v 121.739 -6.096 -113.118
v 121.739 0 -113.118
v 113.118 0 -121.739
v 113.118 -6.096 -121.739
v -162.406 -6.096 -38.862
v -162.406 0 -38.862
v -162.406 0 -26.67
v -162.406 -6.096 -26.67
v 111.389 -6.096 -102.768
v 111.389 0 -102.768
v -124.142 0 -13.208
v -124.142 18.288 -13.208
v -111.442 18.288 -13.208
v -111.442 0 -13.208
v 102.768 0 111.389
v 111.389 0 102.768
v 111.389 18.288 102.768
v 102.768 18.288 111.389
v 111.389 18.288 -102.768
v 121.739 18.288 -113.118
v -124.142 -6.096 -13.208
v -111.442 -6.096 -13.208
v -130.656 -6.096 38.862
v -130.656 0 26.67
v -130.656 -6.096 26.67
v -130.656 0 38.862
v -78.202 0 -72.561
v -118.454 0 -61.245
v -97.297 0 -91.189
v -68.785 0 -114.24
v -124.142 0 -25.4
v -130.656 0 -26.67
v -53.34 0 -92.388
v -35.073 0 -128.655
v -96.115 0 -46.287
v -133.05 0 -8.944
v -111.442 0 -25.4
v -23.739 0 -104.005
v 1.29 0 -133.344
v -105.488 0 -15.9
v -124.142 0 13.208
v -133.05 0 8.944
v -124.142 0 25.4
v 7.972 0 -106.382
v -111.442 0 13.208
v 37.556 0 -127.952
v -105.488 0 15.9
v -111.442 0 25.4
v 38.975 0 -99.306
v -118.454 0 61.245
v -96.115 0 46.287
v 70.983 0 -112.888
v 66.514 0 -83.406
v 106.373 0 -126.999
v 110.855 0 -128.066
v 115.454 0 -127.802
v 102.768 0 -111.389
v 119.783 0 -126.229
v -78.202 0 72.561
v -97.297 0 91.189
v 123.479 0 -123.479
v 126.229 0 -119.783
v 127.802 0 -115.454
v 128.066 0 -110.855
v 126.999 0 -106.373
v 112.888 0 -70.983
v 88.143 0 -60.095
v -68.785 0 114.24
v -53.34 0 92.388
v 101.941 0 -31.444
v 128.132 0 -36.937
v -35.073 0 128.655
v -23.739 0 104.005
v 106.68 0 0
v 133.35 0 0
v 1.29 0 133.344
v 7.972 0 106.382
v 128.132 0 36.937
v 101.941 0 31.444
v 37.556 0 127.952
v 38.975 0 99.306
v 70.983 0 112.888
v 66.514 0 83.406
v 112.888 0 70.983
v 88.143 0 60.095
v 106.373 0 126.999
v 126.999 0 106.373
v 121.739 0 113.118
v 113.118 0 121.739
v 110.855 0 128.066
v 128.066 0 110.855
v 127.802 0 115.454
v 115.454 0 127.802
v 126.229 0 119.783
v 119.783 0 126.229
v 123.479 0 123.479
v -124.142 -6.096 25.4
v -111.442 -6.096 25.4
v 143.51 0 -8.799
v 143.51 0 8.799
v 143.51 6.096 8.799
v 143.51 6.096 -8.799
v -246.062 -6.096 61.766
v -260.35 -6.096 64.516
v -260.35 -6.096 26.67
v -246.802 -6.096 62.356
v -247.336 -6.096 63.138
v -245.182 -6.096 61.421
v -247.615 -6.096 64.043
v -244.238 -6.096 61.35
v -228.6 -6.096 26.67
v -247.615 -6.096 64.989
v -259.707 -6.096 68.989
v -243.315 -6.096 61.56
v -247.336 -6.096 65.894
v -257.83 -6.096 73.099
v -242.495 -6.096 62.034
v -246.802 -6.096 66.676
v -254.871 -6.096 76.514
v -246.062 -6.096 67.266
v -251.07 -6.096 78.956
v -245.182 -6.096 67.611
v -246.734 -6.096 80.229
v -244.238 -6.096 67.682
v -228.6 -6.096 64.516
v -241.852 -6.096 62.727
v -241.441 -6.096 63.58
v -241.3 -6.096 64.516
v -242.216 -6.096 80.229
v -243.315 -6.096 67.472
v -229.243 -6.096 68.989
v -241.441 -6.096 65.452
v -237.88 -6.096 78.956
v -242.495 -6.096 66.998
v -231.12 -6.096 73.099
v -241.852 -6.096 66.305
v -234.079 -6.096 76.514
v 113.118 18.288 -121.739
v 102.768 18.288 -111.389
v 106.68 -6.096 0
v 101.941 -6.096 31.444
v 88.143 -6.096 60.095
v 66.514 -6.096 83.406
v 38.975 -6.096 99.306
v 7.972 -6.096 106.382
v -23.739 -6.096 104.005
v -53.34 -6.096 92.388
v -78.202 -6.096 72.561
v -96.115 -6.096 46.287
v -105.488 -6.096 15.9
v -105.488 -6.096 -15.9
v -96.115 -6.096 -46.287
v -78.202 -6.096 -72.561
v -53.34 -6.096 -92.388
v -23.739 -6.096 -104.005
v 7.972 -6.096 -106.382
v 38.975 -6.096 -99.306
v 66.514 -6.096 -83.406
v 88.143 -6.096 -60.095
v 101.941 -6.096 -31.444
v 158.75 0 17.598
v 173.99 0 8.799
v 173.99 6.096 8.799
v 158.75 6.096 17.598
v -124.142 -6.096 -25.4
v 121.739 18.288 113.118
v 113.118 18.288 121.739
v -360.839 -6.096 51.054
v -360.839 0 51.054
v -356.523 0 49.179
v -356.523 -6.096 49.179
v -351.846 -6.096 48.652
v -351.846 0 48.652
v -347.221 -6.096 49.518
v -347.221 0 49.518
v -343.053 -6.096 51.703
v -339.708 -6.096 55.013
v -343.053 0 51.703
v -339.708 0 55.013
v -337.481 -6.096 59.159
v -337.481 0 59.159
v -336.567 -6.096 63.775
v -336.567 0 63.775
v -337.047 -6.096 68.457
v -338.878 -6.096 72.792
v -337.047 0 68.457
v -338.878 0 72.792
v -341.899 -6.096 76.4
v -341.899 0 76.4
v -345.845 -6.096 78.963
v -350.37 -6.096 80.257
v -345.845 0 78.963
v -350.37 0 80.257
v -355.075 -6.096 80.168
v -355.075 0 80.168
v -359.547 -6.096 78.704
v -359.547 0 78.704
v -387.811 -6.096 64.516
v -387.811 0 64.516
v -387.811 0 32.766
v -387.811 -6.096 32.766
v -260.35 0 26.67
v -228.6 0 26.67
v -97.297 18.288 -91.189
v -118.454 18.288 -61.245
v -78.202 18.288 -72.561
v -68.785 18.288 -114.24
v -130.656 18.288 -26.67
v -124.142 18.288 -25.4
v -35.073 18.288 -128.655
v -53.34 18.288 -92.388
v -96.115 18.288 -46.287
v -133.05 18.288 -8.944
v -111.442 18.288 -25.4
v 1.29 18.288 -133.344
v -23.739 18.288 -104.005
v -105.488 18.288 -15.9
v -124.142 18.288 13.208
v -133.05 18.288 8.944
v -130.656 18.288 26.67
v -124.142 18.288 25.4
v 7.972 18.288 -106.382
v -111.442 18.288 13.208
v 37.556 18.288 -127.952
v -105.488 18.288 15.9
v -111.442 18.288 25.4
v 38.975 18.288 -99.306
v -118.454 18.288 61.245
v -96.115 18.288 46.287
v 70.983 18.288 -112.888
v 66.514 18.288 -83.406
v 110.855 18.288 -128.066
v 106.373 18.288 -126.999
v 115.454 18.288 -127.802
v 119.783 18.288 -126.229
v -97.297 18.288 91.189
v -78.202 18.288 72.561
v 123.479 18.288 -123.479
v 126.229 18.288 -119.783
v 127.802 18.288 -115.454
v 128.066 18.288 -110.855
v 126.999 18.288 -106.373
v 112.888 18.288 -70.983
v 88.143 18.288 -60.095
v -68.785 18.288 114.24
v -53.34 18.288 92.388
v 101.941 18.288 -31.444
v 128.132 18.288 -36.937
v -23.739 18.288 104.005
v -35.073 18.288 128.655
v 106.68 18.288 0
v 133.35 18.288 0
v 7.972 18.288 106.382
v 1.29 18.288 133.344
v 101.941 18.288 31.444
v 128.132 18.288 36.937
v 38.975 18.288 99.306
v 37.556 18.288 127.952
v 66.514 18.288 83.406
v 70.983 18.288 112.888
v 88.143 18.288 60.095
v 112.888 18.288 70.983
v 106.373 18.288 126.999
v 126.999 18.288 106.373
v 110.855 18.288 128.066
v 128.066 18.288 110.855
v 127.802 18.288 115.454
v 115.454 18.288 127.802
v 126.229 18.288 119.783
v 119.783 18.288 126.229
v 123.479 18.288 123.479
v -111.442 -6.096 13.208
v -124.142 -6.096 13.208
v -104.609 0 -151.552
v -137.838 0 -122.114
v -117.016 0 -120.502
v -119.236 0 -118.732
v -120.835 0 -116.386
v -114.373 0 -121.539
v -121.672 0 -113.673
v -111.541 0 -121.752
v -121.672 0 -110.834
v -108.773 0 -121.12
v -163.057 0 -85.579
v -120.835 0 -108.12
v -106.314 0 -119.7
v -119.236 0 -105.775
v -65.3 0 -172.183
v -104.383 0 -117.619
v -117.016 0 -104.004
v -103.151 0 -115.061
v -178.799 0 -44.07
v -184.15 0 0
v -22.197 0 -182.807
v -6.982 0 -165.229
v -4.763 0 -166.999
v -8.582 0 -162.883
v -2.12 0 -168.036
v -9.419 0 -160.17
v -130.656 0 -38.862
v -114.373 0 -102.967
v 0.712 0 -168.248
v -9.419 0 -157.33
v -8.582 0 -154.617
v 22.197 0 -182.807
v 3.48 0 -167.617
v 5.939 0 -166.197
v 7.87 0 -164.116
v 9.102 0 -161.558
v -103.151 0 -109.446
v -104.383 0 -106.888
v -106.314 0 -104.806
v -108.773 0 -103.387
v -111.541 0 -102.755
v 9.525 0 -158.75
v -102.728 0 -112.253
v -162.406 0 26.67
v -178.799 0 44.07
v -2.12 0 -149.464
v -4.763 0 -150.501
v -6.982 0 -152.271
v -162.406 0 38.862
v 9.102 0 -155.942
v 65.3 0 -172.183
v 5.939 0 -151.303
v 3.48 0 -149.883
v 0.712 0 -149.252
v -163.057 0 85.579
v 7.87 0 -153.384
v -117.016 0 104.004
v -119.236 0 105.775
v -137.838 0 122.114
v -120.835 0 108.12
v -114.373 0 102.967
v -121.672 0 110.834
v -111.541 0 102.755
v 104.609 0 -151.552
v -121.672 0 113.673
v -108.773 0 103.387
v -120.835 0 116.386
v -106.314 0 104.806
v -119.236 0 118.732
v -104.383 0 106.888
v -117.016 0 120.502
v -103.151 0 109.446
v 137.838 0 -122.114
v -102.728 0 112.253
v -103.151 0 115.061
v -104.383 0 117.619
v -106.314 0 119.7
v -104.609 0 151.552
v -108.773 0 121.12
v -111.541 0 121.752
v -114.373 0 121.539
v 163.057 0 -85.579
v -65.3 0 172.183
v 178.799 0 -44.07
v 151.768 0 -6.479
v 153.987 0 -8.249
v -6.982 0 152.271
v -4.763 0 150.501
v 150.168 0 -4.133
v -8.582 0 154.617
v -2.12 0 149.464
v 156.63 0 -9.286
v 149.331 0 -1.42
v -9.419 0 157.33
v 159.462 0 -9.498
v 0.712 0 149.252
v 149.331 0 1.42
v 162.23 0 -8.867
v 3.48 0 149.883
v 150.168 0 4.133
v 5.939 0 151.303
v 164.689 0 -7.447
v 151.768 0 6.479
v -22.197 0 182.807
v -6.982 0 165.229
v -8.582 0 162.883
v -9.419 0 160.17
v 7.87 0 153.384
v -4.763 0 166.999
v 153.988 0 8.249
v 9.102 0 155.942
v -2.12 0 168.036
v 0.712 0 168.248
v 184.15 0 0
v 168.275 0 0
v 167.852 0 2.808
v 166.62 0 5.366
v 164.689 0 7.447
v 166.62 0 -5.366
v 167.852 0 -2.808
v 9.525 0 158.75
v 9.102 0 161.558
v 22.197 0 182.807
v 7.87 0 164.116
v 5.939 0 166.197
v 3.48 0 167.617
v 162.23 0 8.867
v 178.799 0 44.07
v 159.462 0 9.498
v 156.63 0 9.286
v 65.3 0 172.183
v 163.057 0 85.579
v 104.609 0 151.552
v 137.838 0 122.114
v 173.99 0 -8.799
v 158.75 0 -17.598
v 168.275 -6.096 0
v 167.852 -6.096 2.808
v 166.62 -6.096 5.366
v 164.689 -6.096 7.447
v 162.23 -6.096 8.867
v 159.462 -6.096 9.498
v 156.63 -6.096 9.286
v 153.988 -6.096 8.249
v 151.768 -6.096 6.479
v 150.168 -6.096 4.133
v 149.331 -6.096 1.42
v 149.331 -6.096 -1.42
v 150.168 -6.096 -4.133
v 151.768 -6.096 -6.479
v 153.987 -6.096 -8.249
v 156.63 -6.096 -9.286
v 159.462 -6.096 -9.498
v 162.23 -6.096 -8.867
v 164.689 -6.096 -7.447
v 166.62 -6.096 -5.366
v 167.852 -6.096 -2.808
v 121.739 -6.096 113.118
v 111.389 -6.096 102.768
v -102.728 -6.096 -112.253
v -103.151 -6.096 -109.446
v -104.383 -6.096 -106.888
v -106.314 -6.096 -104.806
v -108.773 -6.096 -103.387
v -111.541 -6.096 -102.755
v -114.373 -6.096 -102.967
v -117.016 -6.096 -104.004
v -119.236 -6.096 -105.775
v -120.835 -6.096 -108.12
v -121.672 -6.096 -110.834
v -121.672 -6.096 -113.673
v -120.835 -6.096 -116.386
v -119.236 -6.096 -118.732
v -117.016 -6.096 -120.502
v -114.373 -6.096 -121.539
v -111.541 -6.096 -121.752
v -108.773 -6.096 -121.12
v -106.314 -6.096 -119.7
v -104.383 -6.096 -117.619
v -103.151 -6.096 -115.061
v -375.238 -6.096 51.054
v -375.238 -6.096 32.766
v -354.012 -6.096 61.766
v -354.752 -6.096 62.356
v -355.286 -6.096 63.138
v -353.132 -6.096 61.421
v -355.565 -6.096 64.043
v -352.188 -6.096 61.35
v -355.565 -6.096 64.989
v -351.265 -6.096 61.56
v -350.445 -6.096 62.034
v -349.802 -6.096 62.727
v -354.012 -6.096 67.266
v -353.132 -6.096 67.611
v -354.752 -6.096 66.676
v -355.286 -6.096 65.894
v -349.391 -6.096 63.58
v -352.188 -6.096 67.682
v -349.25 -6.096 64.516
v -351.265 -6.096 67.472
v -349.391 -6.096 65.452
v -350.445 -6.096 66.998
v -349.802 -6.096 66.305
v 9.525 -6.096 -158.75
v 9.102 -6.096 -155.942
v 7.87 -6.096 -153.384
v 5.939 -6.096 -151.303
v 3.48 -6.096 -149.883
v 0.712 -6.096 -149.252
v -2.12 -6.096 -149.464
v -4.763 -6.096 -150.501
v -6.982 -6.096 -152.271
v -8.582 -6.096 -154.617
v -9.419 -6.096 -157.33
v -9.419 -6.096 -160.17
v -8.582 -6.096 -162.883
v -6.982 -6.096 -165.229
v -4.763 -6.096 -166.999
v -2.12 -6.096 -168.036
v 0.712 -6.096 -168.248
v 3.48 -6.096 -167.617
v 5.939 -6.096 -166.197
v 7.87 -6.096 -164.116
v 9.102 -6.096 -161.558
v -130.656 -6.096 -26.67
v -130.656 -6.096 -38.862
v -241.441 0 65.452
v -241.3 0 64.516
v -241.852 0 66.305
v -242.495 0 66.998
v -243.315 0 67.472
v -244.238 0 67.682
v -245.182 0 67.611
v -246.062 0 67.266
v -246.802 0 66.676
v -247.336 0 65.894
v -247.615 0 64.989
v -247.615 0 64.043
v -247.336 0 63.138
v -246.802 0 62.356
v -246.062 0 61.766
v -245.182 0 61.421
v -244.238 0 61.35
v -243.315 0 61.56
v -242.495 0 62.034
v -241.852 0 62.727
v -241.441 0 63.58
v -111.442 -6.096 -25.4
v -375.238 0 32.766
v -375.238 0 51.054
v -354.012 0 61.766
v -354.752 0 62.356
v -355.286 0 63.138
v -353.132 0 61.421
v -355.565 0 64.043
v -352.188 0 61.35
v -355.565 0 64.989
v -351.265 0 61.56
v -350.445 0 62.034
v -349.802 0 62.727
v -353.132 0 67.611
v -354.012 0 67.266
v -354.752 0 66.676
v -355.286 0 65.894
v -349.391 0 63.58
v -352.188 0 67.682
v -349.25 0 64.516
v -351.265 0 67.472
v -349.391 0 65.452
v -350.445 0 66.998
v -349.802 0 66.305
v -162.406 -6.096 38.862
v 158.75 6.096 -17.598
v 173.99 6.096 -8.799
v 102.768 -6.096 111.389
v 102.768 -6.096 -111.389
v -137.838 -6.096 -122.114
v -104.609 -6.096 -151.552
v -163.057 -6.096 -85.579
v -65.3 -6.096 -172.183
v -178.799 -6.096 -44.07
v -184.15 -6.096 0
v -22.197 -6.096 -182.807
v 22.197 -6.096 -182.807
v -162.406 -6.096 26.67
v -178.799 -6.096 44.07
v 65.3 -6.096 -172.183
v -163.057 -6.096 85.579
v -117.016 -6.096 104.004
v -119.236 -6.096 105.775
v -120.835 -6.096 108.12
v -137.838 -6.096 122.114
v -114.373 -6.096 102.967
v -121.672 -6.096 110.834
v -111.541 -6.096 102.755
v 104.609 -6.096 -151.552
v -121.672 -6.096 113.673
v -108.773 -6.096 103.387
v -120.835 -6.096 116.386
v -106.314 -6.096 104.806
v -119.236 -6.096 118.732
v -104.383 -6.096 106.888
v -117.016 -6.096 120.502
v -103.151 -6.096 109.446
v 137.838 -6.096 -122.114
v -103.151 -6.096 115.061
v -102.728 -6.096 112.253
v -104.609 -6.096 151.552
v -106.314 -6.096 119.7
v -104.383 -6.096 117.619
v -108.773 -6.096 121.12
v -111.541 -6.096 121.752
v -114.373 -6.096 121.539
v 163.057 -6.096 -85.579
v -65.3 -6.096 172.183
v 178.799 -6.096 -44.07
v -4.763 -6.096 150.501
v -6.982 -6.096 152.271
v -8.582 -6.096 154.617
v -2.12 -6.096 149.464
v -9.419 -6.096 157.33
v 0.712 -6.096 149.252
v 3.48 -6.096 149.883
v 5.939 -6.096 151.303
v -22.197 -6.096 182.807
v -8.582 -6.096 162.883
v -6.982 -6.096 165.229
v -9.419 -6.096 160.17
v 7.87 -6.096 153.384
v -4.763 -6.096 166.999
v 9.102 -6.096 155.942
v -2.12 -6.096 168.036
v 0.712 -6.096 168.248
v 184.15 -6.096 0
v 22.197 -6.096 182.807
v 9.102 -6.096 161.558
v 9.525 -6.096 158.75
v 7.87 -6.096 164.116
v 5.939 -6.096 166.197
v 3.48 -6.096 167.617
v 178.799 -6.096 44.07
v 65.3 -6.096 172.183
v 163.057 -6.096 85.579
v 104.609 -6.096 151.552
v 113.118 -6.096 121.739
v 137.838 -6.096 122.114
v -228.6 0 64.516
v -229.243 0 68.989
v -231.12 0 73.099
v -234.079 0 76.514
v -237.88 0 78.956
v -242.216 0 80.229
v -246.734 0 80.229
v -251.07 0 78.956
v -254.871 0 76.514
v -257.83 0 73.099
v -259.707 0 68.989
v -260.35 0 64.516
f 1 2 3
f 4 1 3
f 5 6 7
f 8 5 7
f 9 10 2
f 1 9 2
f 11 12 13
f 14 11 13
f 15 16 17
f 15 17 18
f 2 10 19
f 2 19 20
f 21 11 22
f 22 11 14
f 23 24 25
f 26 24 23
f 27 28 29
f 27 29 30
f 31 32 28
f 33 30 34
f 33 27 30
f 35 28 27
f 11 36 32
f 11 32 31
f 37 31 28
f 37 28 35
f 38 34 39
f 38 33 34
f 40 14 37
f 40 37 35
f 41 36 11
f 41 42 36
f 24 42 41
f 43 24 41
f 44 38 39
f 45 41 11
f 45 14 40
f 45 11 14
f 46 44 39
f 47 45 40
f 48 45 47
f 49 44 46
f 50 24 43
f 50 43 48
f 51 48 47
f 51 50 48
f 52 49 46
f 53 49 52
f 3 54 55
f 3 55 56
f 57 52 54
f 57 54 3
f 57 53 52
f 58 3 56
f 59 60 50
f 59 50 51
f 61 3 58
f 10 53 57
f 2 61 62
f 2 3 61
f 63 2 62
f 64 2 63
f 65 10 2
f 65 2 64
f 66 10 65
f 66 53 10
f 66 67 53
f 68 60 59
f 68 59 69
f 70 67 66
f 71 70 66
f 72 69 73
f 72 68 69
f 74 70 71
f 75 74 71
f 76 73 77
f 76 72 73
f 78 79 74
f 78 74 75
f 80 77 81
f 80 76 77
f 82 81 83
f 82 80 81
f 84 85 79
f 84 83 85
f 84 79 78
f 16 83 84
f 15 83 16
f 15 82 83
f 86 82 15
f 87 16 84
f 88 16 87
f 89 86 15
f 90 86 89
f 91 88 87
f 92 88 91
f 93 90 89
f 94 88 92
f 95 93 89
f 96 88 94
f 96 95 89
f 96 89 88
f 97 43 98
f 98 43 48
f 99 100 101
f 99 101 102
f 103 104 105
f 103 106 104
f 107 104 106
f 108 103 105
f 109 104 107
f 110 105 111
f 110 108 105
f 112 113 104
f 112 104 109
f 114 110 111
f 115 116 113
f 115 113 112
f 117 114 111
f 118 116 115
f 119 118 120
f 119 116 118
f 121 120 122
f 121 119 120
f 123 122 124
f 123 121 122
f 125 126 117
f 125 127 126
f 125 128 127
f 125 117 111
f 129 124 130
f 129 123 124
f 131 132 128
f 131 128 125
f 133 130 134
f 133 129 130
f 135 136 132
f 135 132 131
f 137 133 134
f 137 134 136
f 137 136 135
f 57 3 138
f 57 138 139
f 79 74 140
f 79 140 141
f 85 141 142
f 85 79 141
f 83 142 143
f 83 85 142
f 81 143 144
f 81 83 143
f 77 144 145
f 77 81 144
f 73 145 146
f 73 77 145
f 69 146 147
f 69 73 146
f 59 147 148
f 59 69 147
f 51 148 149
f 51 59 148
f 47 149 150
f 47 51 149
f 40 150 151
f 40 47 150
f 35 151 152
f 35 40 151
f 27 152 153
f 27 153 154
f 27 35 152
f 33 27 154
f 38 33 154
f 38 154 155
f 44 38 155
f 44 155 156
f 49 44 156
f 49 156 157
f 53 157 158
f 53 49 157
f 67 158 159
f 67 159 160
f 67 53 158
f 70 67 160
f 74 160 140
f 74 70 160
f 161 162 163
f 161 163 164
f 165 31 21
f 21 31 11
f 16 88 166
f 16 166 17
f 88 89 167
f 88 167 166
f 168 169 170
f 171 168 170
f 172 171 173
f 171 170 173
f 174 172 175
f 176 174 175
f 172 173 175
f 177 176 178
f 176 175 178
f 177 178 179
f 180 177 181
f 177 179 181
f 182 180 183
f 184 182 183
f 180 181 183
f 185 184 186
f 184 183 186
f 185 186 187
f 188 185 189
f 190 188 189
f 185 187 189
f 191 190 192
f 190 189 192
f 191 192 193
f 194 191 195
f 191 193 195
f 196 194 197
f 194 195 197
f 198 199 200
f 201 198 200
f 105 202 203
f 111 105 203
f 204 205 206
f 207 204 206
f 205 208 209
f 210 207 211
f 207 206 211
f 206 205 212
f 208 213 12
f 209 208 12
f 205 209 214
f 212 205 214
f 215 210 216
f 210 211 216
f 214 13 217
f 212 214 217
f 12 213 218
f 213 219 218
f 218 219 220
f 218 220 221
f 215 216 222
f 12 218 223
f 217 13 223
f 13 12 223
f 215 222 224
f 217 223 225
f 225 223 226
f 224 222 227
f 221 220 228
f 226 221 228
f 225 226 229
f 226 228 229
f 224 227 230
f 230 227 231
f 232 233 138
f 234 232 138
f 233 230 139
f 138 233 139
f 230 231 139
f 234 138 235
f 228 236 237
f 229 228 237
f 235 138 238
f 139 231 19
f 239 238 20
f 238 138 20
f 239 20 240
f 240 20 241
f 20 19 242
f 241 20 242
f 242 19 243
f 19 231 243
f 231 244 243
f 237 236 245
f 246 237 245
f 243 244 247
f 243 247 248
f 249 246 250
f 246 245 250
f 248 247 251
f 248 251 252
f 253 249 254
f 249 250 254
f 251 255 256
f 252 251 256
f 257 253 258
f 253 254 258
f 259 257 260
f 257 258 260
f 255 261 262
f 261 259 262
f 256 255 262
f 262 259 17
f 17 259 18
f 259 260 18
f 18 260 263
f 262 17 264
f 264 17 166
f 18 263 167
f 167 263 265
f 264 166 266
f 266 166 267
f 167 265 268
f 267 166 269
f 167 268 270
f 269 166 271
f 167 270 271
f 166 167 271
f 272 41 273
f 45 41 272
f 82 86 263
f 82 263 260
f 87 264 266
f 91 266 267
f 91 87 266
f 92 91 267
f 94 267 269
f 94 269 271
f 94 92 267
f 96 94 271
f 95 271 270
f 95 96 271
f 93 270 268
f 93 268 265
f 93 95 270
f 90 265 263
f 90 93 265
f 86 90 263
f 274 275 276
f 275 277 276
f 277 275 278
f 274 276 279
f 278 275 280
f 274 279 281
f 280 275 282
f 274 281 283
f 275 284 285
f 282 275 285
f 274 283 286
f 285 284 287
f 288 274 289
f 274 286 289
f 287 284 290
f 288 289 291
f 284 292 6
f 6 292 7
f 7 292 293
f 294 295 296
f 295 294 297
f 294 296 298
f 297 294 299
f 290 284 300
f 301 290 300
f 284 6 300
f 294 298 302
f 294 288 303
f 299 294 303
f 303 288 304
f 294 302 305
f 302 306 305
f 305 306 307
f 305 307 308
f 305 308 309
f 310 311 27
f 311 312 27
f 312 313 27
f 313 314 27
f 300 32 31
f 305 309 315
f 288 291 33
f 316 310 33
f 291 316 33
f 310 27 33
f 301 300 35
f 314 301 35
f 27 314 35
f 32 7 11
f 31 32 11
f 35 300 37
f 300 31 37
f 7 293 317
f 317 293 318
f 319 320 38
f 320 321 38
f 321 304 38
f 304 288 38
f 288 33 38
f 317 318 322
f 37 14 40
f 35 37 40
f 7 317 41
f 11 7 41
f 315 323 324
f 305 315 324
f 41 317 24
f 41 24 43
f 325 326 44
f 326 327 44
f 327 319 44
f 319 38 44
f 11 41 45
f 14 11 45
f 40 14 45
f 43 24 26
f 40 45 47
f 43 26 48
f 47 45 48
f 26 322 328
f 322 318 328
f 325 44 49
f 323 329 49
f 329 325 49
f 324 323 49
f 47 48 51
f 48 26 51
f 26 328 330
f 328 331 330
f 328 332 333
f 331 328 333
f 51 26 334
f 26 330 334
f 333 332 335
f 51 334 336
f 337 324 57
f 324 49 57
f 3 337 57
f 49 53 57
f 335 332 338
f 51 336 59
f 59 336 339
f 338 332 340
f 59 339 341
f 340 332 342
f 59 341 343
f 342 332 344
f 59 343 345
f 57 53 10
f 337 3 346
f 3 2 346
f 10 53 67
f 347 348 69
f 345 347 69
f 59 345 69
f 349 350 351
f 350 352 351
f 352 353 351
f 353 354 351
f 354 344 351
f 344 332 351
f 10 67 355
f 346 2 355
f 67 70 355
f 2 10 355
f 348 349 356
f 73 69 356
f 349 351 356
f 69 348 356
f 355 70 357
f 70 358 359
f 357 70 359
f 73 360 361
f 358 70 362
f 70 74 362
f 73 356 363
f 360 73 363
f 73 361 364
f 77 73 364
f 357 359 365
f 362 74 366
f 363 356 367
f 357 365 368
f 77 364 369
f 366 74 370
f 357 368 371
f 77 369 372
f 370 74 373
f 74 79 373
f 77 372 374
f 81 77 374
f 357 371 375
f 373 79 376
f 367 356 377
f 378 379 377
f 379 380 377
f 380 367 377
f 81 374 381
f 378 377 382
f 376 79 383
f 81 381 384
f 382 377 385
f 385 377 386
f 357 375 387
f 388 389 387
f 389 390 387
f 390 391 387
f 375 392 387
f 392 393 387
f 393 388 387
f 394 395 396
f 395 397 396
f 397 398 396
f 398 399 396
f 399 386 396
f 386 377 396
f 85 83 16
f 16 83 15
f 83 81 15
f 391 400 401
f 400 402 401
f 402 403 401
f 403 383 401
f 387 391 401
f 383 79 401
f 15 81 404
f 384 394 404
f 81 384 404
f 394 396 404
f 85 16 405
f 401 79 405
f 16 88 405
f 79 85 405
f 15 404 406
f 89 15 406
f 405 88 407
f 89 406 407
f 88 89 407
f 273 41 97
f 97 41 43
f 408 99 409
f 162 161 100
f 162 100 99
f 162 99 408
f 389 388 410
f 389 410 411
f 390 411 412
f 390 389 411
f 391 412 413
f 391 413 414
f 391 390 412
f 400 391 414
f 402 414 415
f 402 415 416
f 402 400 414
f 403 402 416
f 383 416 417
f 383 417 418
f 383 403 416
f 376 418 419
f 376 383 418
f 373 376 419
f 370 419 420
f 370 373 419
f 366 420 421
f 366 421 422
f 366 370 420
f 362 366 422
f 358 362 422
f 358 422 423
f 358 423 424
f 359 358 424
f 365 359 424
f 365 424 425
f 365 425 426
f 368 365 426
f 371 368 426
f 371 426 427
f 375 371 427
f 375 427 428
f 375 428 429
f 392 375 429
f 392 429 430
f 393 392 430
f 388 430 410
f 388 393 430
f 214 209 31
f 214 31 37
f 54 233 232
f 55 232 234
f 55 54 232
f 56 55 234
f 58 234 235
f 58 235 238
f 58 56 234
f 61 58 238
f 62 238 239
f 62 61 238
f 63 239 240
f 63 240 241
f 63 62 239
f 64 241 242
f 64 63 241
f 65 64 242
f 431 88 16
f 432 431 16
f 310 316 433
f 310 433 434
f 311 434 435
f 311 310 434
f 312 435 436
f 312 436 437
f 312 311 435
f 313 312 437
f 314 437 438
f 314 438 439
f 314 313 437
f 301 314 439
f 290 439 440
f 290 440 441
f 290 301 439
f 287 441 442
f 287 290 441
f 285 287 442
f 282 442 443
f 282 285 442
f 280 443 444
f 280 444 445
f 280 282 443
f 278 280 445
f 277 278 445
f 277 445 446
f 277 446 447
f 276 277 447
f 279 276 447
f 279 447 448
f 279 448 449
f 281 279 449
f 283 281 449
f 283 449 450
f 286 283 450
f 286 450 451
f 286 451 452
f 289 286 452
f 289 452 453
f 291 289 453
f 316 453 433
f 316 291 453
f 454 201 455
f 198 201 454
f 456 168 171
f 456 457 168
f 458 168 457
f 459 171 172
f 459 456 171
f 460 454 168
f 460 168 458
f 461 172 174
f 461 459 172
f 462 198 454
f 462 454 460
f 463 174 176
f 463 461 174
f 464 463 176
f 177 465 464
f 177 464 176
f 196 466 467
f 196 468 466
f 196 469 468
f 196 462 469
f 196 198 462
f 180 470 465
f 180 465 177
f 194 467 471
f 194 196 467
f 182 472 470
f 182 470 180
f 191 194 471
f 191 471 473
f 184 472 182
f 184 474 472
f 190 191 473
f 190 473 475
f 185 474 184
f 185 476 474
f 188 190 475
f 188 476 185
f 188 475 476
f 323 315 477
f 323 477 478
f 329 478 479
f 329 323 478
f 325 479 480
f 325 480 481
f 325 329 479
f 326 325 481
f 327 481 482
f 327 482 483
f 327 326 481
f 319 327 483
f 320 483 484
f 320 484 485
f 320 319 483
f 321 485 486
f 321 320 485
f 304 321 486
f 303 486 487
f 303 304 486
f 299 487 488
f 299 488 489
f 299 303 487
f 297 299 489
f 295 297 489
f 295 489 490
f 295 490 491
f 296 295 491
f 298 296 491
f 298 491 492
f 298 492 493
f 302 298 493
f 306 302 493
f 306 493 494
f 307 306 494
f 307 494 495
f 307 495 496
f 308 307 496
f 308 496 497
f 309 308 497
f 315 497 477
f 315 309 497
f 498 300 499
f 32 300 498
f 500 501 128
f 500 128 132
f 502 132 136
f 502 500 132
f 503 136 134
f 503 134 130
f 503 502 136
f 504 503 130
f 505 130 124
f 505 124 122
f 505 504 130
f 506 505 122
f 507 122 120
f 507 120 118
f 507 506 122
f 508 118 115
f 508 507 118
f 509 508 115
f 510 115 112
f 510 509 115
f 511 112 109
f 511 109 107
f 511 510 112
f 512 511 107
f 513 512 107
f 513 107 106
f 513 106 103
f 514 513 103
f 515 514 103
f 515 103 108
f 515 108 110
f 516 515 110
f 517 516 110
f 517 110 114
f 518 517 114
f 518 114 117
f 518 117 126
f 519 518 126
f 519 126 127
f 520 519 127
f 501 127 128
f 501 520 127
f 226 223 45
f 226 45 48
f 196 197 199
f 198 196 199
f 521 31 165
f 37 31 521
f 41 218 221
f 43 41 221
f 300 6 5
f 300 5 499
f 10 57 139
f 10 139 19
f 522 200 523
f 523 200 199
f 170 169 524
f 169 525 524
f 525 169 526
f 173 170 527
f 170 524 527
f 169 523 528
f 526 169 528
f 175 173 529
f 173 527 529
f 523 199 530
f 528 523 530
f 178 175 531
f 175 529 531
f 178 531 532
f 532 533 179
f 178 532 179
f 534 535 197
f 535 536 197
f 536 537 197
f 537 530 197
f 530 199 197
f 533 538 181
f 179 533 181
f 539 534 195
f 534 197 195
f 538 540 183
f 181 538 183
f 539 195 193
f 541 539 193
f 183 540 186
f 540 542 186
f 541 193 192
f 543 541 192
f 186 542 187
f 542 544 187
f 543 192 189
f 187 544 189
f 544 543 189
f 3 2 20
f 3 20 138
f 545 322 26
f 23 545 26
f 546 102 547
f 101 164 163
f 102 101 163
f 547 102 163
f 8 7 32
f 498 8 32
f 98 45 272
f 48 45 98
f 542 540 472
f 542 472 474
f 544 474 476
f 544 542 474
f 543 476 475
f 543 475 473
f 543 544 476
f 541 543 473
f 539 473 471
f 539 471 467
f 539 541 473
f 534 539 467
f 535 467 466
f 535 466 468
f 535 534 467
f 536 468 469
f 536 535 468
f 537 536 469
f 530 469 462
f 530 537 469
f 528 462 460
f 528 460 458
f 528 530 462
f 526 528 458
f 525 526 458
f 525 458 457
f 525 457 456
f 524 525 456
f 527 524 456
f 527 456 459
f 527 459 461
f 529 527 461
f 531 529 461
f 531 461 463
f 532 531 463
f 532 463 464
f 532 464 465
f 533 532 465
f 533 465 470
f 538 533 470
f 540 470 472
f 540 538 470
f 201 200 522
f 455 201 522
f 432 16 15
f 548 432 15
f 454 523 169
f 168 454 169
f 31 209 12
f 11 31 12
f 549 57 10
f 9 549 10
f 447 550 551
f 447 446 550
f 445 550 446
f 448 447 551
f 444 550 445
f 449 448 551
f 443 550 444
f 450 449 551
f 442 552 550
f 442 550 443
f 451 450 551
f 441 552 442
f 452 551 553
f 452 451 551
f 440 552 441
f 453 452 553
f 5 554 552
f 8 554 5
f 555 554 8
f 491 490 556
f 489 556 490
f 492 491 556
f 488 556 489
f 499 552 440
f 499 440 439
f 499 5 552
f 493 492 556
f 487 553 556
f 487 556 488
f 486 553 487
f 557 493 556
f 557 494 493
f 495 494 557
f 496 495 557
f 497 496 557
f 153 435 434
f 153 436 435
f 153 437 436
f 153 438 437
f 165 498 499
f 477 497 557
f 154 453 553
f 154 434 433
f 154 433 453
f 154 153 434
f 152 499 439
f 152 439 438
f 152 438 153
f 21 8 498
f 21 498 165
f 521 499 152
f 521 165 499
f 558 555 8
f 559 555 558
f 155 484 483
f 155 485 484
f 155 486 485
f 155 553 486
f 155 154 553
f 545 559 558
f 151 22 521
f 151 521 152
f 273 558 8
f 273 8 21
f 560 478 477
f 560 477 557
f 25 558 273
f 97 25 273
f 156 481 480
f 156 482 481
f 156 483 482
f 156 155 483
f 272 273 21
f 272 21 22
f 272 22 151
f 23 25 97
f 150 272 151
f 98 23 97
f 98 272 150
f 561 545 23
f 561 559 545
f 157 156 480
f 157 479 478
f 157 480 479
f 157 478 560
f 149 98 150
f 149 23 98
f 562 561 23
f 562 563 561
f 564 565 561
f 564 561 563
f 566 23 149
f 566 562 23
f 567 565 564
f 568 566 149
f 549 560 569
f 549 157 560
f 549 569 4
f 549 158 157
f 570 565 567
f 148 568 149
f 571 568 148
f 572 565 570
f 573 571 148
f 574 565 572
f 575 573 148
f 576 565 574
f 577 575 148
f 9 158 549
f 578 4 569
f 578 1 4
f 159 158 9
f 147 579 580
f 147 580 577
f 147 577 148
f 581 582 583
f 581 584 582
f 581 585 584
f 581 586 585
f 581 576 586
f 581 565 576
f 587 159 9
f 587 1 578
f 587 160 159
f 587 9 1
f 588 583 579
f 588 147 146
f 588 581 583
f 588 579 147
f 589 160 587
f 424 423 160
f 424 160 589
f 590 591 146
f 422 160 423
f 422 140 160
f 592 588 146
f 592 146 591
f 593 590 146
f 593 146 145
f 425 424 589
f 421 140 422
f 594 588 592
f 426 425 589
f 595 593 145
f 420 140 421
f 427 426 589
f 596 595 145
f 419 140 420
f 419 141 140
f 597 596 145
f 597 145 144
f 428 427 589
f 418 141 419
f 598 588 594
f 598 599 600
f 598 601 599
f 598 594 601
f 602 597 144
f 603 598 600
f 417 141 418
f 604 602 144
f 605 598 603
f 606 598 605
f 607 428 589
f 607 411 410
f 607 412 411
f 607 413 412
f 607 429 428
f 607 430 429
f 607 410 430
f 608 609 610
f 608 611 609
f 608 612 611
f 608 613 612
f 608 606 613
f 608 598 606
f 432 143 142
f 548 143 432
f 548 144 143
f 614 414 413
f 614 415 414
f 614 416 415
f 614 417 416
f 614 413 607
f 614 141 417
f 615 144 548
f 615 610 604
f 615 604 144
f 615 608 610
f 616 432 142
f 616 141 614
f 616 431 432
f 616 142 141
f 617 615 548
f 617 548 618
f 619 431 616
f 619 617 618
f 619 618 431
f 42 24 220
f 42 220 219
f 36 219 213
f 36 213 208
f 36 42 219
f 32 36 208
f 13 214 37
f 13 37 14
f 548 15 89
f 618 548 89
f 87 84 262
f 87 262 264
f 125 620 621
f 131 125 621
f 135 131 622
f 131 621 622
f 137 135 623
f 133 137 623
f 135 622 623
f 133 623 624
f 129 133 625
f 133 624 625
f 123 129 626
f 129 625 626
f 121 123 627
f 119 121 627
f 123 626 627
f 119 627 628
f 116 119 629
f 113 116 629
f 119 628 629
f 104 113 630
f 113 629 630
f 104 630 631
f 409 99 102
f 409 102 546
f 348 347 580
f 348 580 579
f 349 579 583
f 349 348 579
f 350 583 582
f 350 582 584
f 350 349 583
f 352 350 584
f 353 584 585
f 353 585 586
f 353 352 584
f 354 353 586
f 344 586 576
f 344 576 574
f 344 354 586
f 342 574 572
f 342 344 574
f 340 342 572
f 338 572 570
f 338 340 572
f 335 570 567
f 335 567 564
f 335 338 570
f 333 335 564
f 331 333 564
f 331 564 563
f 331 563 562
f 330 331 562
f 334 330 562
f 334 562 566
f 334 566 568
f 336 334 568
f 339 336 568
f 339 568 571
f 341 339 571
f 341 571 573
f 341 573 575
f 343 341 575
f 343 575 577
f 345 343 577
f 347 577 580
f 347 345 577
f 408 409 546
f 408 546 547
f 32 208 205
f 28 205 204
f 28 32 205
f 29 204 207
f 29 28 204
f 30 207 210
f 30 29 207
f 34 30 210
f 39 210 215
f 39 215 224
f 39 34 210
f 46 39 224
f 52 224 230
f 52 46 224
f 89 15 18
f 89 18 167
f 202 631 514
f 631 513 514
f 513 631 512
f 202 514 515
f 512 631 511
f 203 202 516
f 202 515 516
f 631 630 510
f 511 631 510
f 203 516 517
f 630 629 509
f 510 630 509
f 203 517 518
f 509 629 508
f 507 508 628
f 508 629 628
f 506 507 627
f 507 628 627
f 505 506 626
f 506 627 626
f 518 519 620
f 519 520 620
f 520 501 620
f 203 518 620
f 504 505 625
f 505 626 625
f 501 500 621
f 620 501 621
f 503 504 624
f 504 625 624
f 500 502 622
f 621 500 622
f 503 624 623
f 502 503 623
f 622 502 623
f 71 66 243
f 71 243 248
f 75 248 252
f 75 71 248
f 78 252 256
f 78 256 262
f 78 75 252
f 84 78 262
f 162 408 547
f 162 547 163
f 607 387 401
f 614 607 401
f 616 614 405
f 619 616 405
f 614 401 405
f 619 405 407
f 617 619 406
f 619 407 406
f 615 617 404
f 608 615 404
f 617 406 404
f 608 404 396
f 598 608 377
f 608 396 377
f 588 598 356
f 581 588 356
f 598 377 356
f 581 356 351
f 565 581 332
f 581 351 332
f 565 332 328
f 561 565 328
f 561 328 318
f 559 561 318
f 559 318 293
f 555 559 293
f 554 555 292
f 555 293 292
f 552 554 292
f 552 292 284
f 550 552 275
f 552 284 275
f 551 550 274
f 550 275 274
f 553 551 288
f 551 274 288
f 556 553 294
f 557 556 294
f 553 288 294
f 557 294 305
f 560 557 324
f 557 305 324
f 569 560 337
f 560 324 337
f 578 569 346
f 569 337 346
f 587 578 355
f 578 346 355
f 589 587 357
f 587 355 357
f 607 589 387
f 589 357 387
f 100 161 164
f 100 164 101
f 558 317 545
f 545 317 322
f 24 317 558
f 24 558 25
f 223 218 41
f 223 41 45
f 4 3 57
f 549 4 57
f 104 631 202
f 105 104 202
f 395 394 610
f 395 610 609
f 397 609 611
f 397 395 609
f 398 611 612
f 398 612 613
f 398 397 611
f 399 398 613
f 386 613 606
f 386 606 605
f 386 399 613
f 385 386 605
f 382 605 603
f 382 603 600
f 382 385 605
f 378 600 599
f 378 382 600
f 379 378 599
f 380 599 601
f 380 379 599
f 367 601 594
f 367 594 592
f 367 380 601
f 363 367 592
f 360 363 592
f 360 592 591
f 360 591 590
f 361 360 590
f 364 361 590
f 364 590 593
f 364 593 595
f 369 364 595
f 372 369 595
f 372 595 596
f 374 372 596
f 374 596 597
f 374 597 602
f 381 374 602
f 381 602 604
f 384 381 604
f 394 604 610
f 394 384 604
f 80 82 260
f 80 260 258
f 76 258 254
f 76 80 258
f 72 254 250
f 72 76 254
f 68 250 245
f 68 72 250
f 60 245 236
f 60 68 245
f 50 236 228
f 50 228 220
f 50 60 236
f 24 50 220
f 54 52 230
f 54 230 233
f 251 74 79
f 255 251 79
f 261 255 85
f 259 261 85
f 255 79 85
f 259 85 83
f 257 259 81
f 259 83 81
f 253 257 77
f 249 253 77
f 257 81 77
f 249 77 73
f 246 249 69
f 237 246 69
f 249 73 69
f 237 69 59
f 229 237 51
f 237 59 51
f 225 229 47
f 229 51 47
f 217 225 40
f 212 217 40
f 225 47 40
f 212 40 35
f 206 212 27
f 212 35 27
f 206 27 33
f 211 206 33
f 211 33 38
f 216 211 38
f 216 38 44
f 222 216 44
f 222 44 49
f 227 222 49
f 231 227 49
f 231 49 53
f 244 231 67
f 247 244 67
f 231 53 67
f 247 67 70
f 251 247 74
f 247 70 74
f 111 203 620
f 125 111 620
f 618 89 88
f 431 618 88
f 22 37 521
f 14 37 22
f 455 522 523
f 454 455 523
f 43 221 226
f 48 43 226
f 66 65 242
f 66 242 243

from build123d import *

# Parameters (mm, degrees)
F0_R     = 3.175
F1_DEPTH = 6.096
F0_R_2   = 184.15
F0_R_3   = 9.525
F0_W     = 31.75
F0_H     = 12.192
F0_W_2   = 12.7
F0_R_4   = 106.68
F2_DEPTH = 18.288
F3_DEPTH = 6.096


with BuildPart() as f1:
    # F0 (on Front) → F1 (new body)
    with BuildSketch(Plane.XZ):
        with BuildLine():
            Line((-375.2378275289, 51.054), (-360.8386900941, 51.054))
            ThreePointArc((-360.8386900941, 51.054), (-336.5672961231, 63.7751540287), (-359.5469367357, 78.7037990588))
            Line((-359.5469367357, 78.7037990588), (-387.8108275289, 64.516))
            Line((-387.8108275289, 64.516), (-387.8108275289, 51.054))
            Line((-387.8108275289, 51.054), (-387.8108275289, 32.766))
            Line((-387.8108275289, 32.766), (-375.2378275289, 32.766))
            Line((-375.2378275289, 32.766), (-375.2378275289, 51.054))
        make_face()
        with Locations((-352.425, 64.516)):
            Circle(F0_R, mode=Mode.SUBTRACT)
    extrude(amount=F1_DEPTH)


with BuildPart() as f1b:
    # F0 (on Front) → F1, piece 2 (new body)
    with BuildSketch(Plane.XZ):
        with BuildLine():
            Line((-260.35, 26.67), (-228.6, 26.67))
            Line((-228.6, 26.67), (-228.6, 64.516))
            ThreePointArc((-228.6, 64.516), (-244.475, 80.391), (-260.35, 64.516))
            Line((-260.35, 64.516), (-260.35, 26.67))
        make_face()
        with Locations((-244.475, 64.516)):
            Circle(F0_R, mode=Mode.SUBTRACT)
    extrude(amount=F1_DEPTH)


with BuildPart() as f1c:
    # F0 (on Front) → F1, piece 3 (new body)
    with BuildSketch(Plane.XZ):
        Circle(F0_R_2)
        with Locations((-112.2532015134, -112.2532015134)):
            Circle(F0_R_3, mode=Mode.SUBTRACT)
        with Locations((-146.5307828801, -32.766)):
            Rectangle(F0_W, F0_H, mode=Mode.SUBTRACT)
        with Locations((0, -158.75)):
            Circle(F0_R_3, mode=Mode.SUBTRACT)
        with BuildLine():
            ThreePointArc((-130.6557828801, 26.67), (-52.4268957675, 122.6117575936), (70.9830781801, 112.8876658988))
            Line((70.9830781801, 112.8876658988), (106.373407311, 126.9991719846))
            ThreePointArc((106.373407311, 126.9991719846), (123.4785216647, 123.4785216647), (126.9991719846, 106.373407311))
            Line((126.9991719846, 106.373407311), (112.8876658988, 70.9830781801))
            ThreePointArc((112.8876658988, 70.9830781801), (133.35, 0), (112.8876658988, -70.9830781801))
            Line((112.8876658988, -70.9830781801), (126.9991719846, -106.373407311))
            ThreePointArc((126.9991719846, -106.373407311), (123.4785216647, -123.4785216647), (106.373407311, -126.9991719846))
            Line((106.373407311, -126.9991719846), (70.9830781801, -112.8876658988))
            ThreePointArc((70.9830781801, -112.8876658988), (-52.4268957675, -122.6117575936), (-130.6557828801, -26.67))
            ThreePointArc((-130.6557828801, -26.67), (-133.35, 0), (-130.6557828801, 26.67))
        make_face(mode=Mode.SUBTRACT)
        Polygon((158.75, 17.5976362049), (173.99, 8.7988181024), (173.99, -8.7988181024), (158.75, -17.5976362049), (143.51, -8.7988181024), (143.51, 8.7988181024), align=None, mode=Mode.SUBTRACT)
        with Locations((-146.5307828801, 32.766)):
            Rectangle(F0_W, F0_H, mode=Mode.SUBTRACT)
        with Locations((-112.2532015134, 112.2532015134)):
            Circle(F0_R_3, mode=Mode.SUBTRACT)
        with Locations((0, 158.75)):
            Circle(F0_R_3, mode=Mode.SUBTRACT)
        with BuildLine():
            ThreePointArc((112.8876658988, 70.9830781801), (94.2926892712, 94.2926892712), (70.9830781801, 112.8876658988))
            ThreePointArc((70.9830781801, 112.8876658988), (-52.4268957675, 122.6117575936), (-130.6557828801, 26.67))
            ThreePointArc((-130.6557828801, 26.67), (-133.35, 0), (-130.6557828801, -26.67))
            ThreePointArc((-130.6557828801, -26.67), (-52.4268957675, -122.6117575936), (70.9830781801, -112.8876658988))
            ThreePointArc((70.9830781801, -112.8876658988), (94.2926892712, -94.2926892712), (112.8876658988, -70.9830781801))
            ThreePointArc((112.8876658988, -70.9830781801), (133.35, 0), (112.8876658988, 70.9830781801))
        make_face()
        with Locations((-117.7920477199, -19.304)):
            Rectangle(F0_W_2, F0_H, mode=Mode.SUBTRACT)
        Circle(F0_R_4, mode=Mode.SUBTRACT)
        with Locations((-117.7920477199, 19.304)):
            Rectangle(F0_W_2, F0_H, mode=Mode.SUBTRACT)
        with BuildLine():
            Line((106.373407311, 126.9991719846), (70.9830781801, 112.8876658988))
            ThreePointArc((70.9830781801, 112.8876658988), (94.2926892712, 94.2926892712), (112.8876658988, 70.9830781801))
            Line((112.8876658988, 70.9830781801), (126.9991719846, 106.373407311))
            ThreePointArc((126.9991719846, 106.373407311), (123.4785216647, 123.4785216647), (106.373407311, 126.9991719846))
        make_face()
        Polygon((111.388571845, 102.7675259688), (102.7675259688, 111.388571845), (113.1178311817, 121.7388770579), (121.7388770579, 113.1178311817), align=None, mode=Mode.SUBTRACT)
        with BuildLine():
            Line((126.9991719846, -106.373407311), (112.8876658988, -70.9830781801))
            ThreePointArc((112.8876658988, -70.9830781801), (94.2926892712, -94.2926892712), (70.9830781801, -112.8876658988))
            Line((70.9830781801, -112.8876658988), (106.373407311, -126.9991719846))
            ThreePointArc((106.373407311, -126.9991719846), (123.4785216647, -123.4785216647), (126.9991719846, -106.373407311))
        make_face()
        Polygon((121.7388770579, -113.1178311817), (113.1178311817, -121.7388770579), (102.7675259688, -111.388571845), (111.388571845, -102.7675259688), align=None, mode=Mode.SUBTRACT)
        Polygon((173.99, -8.7988181024), (173.99, 8.7988181024), (158.75, 17.5976362049), (143.51, 8.7988181024), (143.51, -8.7988181024), (158.75, -17.5976362049), align=None)
        with Locations((158.75, 0)):
            Circle(F0_R_3, mode=Mode.SUBTRACT)
    extrude(amount=F1_DEPTH)


with BuildPart() as f2:
    # F0 (on Front) → F2 (new body)
    with BuildSketch(Plane.XZ):
        with BuildLine():
            ThreePointArc((112.8876658988, 70.9830781801), (94.2926892712, 94.2926892712), (70.9830781801, 112.8876658988))
            ThreePointArc((70.9830781801, 112.8876658988), (-52.4268957675, 122.6117575936), (-130.6557828801, 26.67))
            ThreePointArc((-130.6557828801, 26.67), (-133.35, 0), (-130.6557828801, -26.67))
            ThreePointArc((-130.6557828801, -26.67), (-52.4268957675, -122.6117575936), (70.9830781801, -112.8876658988))
            ThreePointArc((70.9830781801, -112.8876658988), (94.2926892712, -94.2926892712), (112.8876658988, -70.9830781801))
            ThreePointArc((112.8876658988, -70.9830781801), (133.35, 0), (112.8876658988, 70.9830781801))
        make_face()
        with Locations((-117.7920477199, -19.304)):
            Rectangle(F0_W_2, F0_H, mode=Mode.SUBTRACT)
        Circle(F0_R_4, mode=Mode.SUBTRACT)
        with Locations((-117.7920477199, 19.304)):
            Rectangle(F0_W_2, F0_H, mode=Mode.SUBTRACT)
        with BuildLine():
            Line((106.373407311, 126.9991719846), (70.9830781801, 112.8876658988))
            ThreePointArc((70.9830781801, 112.8876658988), (94.2926892712, 94.2926892712), (112.8876658988, 70.9830781801))
            Line((112.8876658988, 70.9830781801), (126.9991719846, 106.373407311))
            ThreePointArc((126.9991719846, 106.373407311), (123.4785216647, 123.4785216647), (106.373407311, 126.9991719846))
        make_face()
        Polygon((111.388571845, 102.7675259688), (102.7675259688, 111.388571845), (113.1178311817, 121.7388770579), (121.7388770579, 113.1178311817), align=None, mode=Mode.SUBTRACT)
        with BuildLine():
            Line((126.9991719846, -106.373407311), (112.8876658988, -70.9830781801))
            ThreePointArc((112.8876658988, -70.9830781801), (94.2926892712, -94.2926892712), (70.9830781801, -112.8876658988))
            Line((70.9830781801, -112.8876658988), (106.373407311, -126.9991719846))
            ThreePointArc((106.373407311, -126.9991719846), (123.4785216647, -123.4785216647), (126.9991719846, -106.373407311))
        make_face()
        Polygon((121.7388770579, -113.1178311817), (113.1178311817, -121.7388770579), (102.7675259688, -111.388571845), (111.388571845, -102.7675259688), align=None, mode=Mode.SUBTRACT)
    extrude(amount=-F2_DEPTH)


with BuildPart() as f3:
    # F0 (on Front) → F3 (new body)
    with BuildSketch(Plane.XZ):
        Polygon((173.99, -8.7988181024), (173.99, 8.7988181024), (158.75, 17.5976362049), (143.51, 8.7988181024), (143.51, -8.7988181024), (158.75, -17.5976362049), align=None)
        with Locations((158.75, 0)):
            Circle(F0_R_3, mode=Mode.SUBTRACT)
        with Locations((158.75, 0)):
            Circle(F0_R_3)
    extrude(amount=-F3_DEPTH)


solid = Compound([f1.part, f1b.part, f1c.part, f2.part, f3.part])
